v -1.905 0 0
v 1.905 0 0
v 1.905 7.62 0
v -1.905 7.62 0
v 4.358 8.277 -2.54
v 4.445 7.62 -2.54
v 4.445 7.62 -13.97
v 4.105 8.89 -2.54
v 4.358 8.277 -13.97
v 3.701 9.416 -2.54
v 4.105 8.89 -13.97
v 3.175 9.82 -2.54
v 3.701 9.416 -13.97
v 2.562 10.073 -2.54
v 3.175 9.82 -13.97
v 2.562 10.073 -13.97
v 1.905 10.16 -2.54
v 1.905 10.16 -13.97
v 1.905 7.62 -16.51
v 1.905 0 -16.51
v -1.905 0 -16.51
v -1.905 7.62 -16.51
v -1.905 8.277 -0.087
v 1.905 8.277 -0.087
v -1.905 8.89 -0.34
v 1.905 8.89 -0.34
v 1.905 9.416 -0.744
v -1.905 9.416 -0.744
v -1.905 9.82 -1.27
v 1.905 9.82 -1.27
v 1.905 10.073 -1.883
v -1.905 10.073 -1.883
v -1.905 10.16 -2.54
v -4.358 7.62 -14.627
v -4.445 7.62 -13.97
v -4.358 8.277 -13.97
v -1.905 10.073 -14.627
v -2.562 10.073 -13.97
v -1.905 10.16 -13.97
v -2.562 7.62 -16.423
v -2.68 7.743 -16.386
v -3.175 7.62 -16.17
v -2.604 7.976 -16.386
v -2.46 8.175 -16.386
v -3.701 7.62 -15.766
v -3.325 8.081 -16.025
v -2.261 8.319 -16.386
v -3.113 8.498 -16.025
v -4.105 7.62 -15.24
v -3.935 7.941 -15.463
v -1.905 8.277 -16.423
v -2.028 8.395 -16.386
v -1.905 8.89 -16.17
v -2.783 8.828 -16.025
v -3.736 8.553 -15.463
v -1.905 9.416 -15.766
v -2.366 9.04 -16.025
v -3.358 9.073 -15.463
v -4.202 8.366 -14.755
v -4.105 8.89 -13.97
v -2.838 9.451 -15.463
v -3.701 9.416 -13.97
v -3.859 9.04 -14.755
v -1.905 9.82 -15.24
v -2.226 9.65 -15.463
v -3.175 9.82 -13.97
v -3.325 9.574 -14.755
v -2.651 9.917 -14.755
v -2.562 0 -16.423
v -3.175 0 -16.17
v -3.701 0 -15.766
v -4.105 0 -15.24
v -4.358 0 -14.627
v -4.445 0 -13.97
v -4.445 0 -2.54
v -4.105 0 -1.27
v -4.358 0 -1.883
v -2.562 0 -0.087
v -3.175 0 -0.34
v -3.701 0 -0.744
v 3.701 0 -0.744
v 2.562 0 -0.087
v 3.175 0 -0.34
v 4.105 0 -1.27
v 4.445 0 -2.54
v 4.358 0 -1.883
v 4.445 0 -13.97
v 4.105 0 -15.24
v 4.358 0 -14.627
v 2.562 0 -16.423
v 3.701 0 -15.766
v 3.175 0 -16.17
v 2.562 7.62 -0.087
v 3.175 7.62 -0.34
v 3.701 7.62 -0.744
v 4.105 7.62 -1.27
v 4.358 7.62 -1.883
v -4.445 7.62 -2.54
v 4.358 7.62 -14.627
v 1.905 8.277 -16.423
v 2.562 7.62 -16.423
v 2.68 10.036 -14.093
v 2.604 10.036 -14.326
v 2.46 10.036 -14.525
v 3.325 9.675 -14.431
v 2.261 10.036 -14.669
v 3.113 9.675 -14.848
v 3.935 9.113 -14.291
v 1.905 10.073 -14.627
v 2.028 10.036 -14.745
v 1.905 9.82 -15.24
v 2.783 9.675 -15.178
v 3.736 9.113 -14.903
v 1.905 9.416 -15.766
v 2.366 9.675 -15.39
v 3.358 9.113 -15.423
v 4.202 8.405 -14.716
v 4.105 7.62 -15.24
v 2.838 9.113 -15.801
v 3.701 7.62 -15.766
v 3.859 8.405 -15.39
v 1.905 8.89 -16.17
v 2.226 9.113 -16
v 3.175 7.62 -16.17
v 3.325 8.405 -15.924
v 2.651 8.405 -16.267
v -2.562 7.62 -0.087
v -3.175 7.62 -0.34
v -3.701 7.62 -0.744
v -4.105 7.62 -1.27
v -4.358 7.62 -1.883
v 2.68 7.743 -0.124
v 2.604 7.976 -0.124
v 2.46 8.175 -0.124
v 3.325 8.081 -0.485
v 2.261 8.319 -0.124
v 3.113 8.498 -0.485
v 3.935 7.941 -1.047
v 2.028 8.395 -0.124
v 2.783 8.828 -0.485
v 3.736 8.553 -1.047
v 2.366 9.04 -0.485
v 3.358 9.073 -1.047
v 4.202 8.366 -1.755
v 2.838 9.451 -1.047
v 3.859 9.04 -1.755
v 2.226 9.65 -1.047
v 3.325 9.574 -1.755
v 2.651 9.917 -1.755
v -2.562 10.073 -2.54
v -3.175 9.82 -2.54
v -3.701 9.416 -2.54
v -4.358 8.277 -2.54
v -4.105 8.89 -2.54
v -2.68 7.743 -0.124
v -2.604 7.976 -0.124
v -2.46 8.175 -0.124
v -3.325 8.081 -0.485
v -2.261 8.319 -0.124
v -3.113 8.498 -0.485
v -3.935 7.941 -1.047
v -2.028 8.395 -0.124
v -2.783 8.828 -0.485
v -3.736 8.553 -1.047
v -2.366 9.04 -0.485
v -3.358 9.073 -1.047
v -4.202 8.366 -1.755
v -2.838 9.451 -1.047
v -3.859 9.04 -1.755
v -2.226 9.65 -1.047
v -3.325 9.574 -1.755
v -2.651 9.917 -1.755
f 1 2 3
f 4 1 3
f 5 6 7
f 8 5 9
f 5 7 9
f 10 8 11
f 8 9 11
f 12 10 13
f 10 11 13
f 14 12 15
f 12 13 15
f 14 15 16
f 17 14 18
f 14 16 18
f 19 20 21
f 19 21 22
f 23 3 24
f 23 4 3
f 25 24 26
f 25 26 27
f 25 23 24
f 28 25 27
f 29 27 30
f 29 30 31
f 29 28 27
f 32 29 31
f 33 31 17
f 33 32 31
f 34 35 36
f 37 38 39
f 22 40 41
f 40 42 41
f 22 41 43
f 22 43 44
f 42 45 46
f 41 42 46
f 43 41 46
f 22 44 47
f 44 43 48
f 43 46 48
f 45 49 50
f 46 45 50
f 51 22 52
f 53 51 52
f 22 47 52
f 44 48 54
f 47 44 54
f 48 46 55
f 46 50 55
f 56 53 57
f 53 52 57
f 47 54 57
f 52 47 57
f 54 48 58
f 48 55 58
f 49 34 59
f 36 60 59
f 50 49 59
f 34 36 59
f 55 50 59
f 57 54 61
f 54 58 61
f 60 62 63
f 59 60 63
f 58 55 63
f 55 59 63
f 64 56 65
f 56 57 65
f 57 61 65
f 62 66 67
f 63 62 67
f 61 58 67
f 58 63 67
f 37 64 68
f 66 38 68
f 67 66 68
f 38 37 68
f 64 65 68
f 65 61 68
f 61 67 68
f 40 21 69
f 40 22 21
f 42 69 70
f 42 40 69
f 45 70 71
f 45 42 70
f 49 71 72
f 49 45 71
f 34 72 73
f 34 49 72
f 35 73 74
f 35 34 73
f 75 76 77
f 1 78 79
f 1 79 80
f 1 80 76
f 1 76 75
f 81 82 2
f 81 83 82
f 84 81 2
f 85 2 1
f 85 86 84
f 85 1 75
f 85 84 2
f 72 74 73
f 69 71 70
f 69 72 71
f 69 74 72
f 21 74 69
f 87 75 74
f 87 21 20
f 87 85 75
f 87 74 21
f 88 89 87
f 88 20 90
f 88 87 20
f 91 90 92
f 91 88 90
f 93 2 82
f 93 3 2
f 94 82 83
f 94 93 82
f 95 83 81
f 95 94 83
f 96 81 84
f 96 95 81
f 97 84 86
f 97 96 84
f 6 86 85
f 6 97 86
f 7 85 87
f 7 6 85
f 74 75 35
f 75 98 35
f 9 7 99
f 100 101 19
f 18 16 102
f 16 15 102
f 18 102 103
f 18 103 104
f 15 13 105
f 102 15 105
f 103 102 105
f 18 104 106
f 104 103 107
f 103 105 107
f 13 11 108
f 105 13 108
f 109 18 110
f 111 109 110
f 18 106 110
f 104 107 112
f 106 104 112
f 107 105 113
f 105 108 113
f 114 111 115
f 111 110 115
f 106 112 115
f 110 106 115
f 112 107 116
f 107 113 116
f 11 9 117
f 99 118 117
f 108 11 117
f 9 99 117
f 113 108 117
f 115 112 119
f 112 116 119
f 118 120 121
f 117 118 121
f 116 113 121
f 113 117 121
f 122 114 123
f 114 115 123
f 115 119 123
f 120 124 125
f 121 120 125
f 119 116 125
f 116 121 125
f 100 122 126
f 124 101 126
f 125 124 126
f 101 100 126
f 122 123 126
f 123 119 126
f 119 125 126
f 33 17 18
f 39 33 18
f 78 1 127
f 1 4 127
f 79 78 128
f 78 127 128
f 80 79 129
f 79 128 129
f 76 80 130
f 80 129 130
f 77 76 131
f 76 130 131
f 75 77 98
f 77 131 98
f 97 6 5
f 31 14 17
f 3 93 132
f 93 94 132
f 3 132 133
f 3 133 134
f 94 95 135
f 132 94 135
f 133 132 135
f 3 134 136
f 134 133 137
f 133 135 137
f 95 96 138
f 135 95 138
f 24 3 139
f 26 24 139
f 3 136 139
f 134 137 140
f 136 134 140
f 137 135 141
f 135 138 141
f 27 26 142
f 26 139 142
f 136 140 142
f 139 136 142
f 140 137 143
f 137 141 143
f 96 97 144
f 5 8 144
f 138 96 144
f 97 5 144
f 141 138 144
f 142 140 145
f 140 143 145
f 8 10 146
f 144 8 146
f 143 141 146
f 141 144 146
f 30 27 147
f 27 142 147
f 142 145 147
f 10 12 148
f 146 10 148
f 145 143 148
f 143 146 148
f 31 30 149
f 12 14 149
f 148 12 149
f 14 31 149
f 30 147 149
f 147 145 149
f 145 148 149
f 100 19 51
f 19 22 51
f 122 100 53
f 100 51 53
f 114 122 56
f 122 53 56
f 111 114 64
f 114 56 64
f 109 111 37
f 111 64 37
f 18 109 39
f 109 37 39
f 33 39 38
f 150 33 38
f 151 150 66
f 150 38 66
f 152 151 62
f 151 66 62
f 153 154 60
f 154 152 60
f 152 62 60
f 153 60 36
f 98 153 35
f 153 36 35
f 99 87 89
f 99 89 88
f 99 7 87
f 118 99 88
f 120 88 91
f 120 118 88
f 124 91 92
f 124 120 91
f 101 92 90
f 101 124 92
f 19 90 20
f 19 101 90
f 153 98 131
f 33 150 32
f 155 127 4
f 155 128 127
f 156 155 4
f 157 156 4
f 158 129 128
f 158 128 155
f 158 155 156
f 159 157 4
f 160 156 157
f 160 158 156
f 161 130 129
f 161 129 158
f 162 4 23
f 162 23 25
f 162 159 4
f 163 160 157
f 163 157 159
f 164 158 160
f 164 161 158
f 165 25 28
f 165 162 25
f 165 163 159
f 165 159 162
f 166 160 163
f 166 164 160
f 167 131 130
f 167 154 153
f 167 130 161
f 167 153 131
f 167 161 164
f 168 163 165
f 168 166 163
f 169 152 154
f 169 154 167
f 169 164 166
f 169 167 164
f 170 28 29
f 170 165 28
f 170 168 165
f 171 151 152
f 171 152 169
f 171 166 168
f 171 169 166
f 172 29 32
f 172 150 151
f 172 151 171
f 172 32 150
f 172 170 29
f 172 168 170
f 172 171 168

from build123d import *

# Parameters (mm, degrees)
SKETCH1_W           = 16.51
SKETCH1_H           = 10.16
BOSS_EXTRUDE1_DEPTH = 4.445
FILLET1_R           = 2.54


with BuildPart() as part:
    # Sketch1 → Boss-Extrude1 (new body, symmetric)
    with BuildSketch(Plane(origin=(0, 0, 0), x_dir=(0, 0, -1), z_dir=(1, 0, 0))):
        with Locations((8.255, 5.08)):
            Rectangle(SKETCH1_W, SKETCH1_H)
    extrude(amount=BOSS_EXTRUDE1_DEPTH, both=True)

    # Fillet1
    fillet1_edges = [part.edges().sort_by_distance(p)[0] for p in [
        (4.445, 5.08, -16.51),
        (4.445, 10.16, -8.255),
        (4.445, 5.08, 0),
        (-4.445, 10.16, -8.255),
        (-4.445, 5.08, -16.51),
        (-4.445, 5.08, 0),
        (0, 10.16, 0),
        (0, 10.16, -16.51),
    ]]
    fillet(fillet1_edges, radius=FILLET1_R)


solid = part.part
